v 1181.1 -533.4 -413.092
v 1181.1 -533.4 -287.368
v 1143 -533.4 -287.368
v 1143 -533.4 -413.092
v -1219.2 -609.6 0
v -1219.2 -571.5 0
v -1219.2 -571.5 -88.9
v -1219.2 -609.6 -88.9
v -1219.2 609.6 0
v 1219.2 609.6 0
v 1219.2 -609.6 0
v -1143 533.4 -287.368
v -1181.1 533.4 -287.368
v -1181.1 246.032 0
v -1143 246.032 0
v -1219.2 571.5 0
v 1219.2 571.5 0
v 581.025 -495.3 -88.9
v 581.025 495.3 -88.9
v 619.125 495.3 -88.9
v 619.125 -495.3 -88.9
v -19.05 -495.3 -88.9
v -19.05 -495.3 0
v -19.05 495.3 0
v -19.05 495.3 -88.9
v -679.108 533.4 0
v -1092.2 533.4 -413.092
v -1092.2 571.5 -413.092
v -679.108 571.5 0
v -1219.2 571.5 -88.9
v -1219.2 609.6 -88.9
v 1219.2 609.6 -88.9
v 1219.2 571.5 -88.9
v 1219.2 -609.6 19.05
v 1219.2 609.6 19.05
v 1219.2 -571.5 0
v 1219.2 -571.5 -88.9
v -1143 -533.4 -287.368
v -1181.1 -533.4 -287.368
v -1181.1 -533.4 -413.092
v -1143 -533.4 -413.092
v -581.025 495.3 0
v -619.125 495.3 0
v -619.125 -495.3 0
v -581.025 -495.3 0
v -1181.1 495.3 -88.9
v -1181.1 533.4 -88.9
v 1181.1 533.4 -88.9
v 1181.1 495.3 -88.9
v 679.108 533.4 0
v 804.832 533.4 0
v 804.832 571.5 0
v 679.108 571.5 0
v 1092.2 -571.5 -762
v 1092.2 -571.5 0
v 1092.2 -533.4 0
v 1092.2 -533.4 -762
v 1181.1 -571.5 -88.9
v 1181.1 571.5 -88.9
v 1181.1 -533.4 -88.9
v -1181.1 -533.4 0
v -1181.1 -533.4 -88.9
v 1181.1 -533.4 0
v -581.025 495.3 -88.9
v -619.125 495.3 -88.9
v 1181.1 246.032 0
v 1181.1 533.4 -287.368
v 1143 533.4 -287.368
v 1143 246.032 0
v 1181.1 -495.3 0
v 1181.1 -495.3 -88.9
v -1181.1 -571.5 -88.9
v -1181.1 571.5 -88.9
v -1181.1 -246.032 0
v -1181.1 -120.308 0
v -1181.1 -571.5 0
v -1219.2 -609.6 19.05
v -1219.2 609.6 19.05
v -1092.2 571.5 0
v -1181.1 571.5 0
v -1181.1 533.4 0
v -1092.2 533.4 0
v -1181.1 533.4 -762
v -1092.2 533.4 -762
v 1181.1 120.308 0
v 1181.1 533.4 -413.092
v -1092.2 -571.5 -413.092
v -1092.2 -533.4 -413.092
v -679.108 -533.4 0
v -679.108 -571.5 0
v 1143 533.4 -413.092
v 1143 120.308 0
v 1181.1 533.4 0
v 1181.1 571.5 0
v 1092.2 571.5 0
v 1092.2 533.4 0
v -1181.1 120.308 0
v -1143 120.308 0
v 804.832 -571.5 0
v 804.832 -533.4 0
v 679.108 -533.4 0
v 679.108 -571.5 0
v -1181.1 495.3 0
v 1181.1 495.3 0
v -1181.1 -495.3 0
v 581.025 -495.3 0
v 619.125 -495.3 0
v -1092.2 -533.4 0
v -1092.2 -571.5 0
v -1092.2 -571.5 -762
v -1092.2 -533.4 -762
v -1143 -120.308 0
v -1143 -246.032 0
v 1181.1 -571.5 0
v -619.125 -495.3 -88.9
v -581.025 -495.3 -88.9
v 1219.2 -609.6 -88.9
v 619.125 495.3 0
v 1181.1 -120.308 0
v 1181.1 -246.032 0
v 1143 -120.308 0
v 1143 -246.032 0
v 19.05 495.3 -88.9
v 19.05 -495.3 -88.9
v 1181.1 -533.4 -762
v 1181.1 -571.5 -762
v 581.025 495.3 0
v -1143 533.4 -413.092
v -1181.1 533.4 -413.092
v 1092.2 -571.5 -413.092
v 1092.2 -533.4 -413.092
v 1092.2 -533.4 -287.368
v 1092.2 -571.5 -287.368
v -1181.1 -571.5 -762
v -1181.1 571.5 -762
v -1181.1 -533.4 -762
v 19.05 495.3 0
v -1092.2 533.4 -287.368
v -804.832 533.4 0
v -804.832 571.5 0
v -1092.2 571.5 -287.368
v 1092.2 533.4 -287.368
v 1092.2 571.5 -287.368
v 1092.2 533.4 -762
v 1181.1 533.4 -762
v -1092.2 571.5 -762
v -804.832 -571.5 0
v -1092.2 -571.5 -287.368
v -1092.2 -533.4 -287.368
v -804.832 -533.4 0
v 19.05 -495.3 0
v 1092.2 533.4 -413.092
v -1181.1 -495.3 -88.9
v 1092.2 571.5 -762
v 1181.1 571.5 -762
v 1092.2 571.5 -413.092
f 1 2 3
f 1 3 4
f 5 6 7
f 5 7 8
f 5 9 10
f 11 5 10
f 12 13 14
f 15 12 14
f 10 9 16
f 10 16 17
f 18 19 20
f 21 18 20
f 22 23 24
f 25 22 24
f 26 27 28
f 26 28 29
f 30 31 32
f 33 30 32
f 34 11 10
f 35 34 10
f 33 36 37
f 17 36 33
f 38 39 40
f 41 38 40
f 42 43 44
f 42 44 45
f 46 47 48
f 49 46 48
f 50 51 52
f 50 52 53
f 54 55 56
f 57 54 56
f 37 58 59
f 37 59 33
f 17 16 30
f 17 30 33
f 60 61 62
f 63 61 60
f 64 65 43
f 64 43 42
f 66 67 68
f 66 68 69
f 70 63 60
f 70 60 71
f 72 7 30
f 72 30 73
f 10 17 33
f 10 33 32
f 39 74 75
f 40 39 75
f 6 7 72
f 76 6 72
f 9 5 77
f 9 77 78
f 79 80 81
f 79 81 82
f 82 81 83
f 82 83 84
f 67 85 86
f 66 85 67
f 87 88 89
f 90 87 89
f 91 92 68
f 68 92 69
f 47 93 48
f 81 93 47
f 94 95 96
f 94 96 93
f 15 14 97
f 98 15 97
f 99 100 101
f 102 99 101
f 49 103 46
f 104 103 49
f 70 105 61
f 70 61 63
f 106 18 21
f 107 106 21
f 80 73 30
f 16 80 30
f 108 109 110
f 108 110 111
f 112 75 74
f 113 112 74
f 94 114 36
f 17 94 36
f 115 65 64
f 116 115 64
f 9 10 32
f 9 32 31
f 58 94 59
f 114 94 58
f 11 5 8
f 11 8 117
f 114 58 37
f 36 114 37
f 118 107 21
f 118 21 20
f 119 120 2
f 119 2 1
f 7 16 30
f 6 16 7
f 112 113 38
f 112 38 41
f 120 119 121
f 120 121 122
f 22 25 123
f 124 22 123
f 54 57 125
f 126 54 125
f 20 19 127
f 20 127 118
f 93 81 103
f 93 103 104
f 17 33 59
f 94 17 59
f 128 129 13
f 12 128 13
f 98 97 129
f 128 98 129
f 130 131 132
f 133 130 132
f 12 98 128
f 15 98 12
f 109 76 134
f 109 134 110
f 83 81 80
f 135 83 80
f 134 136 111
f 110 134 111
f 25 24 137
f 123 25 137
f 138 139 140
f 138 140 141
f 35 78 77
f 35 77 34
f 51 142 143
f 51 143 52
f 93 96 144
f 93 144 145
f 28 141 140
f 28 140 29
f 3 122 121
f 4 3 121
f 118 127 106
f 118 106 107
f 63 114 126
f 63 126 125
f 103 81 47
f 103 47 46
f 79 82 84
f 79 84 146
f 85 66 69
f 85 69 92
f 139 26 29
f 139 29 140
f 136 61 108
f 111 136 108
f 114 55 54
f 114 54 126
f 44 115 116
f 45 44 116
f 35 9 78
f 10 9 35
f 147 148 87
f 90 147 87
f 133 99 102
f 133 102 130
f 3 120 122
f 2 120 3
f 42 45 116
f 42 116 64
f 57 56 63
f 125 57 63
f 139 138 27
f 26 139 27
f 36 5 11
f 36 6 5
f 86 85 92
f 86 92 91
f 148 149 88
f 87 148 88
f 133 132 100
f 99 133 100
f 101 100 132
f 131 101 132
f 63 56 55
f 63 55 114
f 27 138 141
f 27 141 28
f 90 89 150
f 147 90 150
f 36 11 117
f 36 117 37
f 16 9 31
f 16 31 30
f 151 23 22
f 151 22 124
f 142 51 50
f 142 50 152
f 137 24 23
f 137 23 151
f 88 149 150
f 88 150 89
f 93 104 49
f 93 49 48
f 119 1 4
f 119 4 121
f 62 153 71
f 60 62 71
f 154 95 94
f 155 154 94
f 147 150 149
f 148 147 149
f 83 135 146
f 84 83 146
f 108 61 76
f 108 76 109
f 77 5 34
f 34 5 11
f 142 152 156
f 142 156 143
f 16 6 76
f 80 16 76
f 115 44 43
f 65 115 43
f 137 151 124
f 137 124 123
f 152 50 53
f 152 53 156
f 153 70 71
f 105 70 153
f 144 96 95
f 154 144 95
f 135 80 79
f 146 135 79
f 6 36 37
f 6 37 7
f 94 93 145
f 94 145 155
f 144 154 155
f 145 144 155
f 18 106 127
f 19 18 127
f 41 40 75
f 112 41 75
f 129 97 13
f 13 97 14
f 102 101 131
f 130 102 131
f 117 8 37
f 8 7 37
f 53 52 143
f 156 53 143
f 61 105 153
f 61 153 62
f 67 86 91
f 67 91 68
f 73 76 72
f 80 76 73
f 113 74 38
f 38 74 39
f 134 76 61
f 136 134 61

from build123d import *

# Parameters (mm, degrees)
F1_DEPTH  = 88.9
F2_DEPTH  = 88.9
F0_W      = 38.1
F0_H      = 990.6
F0_W_2    = 88.9
F0_H_2    = 38.1
F3_DEPTH  = 762
F5_W      = 2438.4
F5_H      = 1219.2
F12_DEPTH = 19.05
F7_DEPTH  = 38.1
F10_DEPTH = 38.1


with BuildPart() as f1:
    # F0 (on Top) → F1 (new body)
    with BuildSketch(Plane.XY):
        Polygon((1181.1, 571.5), (1219.2, 571.5), (1219.2, 609.6), (-1219.2, 609.6), (-1219.2, 571.5), (-1181.1, 571.5), (-1092.2, 571.5), (1092.2, 571.5), align=None)
    extrude(amount=-F1_DEPTH)


with BuildPart() as f1b:
    # F0 (on Top) → F1, piece 2 (new body)
    with BuildSketch(Plane.XY):
        Polygon((1181.1, 495.3), (1181.1, 533.4), (1092.2, 533.4), (-1092.2, 533.4), (-1181.1, 533.4), (-1181.1, 495.3), (-619.125, 495.3), (-581.025, 495.3), (-19.05, 495.3), (19.05, 495.3), (581.025, 495.3), (619.125, 495.3), align=None)
    extrude(amount=-F1_DEPTH)


with BuildPart() as f1c:
    # F0 (on Top) → F1, piece 3 (new body)
    with BuildSketch(Plane.XY):
        Polygon((1092.2, -533.4), (1181.1, -533.4), (1181.1, -495.3), (619.125, -495.3), (581.025, -495.3), (19.05, -495.3), (-19.05, -495.3), (-581.025, -495.3), (-619.125, -495.3), (-1181.1, -495.3), (-1181.1, -533.4), (-1092.2, -533.4), align=None)
    extrude(amount=-F1_DEPTH)


with BuildPart() as f1d:
    # F0 (on Top) → F1, piece 4 (new body)
    with BuildSketch(Plane.XY):
        Polygon((-1219.2, -609.6), (1219.2, -609.6), (1219.2, -571.5), (1181.1, -571.5), (1092.2, -571.5), (-1092.2, -571.5), (-1181.1, -571.5), (-1219.2, -571.5), align=None)
    extrude(amount=-F1_DEPTH)


with BuildPart() as f2:
    # F0 (on Top) → F2 (new body)
    with BuildSketch(Plane.XY):
        Polygon((-1219.2, 571.5), (-1219.2, -571.5), (-1181.1, -571.5), (-1181.1, -533.4), (-1181.1, -495.3), (-1181.1, 495.3), (-1181.1, 533.4), (-1181.1, 571.5), align=None)
    extrude(amount=-F2_DEPTH)


with BuildPart() as f2b:
    # F0 (on Top) → F2, piece 2 (new body)
    with BuildSketch(Plane.XY):
        with Locations((-600.075, 0)):
            Rectangle(F0_W, F0_H)
    extrude(amount=-F2_DEPTH)


with BuildPart() as f2c:
    # F0 (on Top) → F2, piece 3 (new body)
    with BuildSketch(Plane.XY):
        Rectangle(F0_W, F0_H)
    extrude(amount=-F2_DEPTH)


with BuildPart() as f2d:
    # F0 (on Top) → F2, piece 4 (new body)
    with BuildSketch(Plane.XY):
        with Locations((600.075, 0)):
            Rectangle(F0_W, F0_H)
    extrude(amount=-F2_DEPTH)


with BuildPart() as f2e:
    # F0 (on Top) → F2, piece 5 (new body)
    with BuildSketch(Plane.XY):
        Polygon((1181.1, -571.5), (1219.2, -571.5), (1219.2, 571.5), (1181.1, 571.5), (1181.1, 533.4), (1181.1, 495.3), (1181.1, -495.3), (1181.1, -533.4), align=None)
    extrude(amount=-F2_DEPTH)


with BuildPart() as f3:
    # F0 (on Top) → F3 (new body)
    with BuildSketch(Plane.XY):
        with Locations((-1136.65, 552.45)):
            Rectangle(F0_W_2, F0_H_2)
    extrude(amount=-F3_DEPTH)


with BuildPart() as f3b:
    # F0 (on Top) → F3, piece 2 (new body)
    with BuildSketch(Plane.XY):
        with Locations((-1136.65, -552.45)):
            Rectangle(F0_W_2, F0_H_2)
    extrude(amount=-F3_DEPTH)


with BuildPart() as f3c:
    # F0 (on Top) → F3, piece 3 (new body)
    with BuildSketch(Plane.XY):
        with Locations((1136.65, 552.45)):
            Rectangle(F0_W_2, F0_H_2)
    extrude(amount=-F3_DEPTH)


with BuildPart() as f3d:
    # F0 (on Top) → F3, piece 4 (new body)
    with BuildSketch(Plane.XY):
        with Locations((1136.65, -552.45)):
            Rectangle(F0_W_2, F0_H_2)
    extrude(amount=-F3_DEPTH)


with BuildPart() as f12:
    # F5 (on face) → F12 (new body)
    with BuildSketch(Plane.XY):
        Rectangle(F5_W, F5_H)
    extrude(amount=F12_DEPTH)


with BuildPart() as f7:
    # F6 (on face) → F7 (new body)
    with BuildSketch(Plane.XZ.offset(533.4)):
        Polygon((-804.8318041258, 0), (-1092.2, -287.3681958742), (-1092.2, -413.0917815692), (-679.1082184308, 0), align=None)
    extrude(amount=F7_DEPTH)


with BuildPart() as f7b:
    # F6 (on face) → F7, piece 2 (new body)
    with BuildSketch(Plane.XZ.offset(533.4)):
        Polygon((1092.2, -287.3681958742), (804.8318041258, 0), (679.1082184308, 0), (1092.2, -413.0917815692), align=None)
    extrude(amount=F7_DEPTH)


with BuildPart() as f8_1:
    # F8: instance of F7
    add(f7.part.mirror(Plane.XZ))


with BuildPart() as f8_2:
    # F8: instance of F7b
    add(f7b.part.mirror(Plane.XZ))


with BuildPart() as f10:
    # F9 (on face) → F10 (new body)
    with BuildSketch(Plane.YZ.offset(-1181.1)):
        Polygon((-120.3082184308, 0), (-246.0318041258, 0), (-533.4, -287.3681958742), (-533.4, -413.0917815692), align=None)
    extrude(amount=F10_DEPTH)


with BuildPart() as f10b:
    # F9 (on face) → F10, piece 2 (new body)
    with BuildSketch(Plane.YZ.offset(-1181.1)):
        Polygon((533.4, -287.3681958742), (246.0318041258, 0), (120.3082184308, 0), (533.4, -413.0917815692), align=None)
    extrude(amount=F10_DEPTH)


with BuildPart() as f11_1:
    # F11: instance of F10
    add(f10.part.mirror(Plane.YZ))


with BuildPart() as f11_2:
    # F11: instance of F10b
    add(f10b.part.mirror(Plane.YZ))


solid = Compound([f1.part, f1b.part, f1c.part, f1d.part, f2.part, f2b.part, f2c.part, f2d.part, f2e.part, f3.part, f3b.part, f3c.part, f3d.part, f12.part, f7.part, f7b.part, f8_1.part, f8_2.part, f10.part, f10b.part, f11_1.part, f11_2.part])
